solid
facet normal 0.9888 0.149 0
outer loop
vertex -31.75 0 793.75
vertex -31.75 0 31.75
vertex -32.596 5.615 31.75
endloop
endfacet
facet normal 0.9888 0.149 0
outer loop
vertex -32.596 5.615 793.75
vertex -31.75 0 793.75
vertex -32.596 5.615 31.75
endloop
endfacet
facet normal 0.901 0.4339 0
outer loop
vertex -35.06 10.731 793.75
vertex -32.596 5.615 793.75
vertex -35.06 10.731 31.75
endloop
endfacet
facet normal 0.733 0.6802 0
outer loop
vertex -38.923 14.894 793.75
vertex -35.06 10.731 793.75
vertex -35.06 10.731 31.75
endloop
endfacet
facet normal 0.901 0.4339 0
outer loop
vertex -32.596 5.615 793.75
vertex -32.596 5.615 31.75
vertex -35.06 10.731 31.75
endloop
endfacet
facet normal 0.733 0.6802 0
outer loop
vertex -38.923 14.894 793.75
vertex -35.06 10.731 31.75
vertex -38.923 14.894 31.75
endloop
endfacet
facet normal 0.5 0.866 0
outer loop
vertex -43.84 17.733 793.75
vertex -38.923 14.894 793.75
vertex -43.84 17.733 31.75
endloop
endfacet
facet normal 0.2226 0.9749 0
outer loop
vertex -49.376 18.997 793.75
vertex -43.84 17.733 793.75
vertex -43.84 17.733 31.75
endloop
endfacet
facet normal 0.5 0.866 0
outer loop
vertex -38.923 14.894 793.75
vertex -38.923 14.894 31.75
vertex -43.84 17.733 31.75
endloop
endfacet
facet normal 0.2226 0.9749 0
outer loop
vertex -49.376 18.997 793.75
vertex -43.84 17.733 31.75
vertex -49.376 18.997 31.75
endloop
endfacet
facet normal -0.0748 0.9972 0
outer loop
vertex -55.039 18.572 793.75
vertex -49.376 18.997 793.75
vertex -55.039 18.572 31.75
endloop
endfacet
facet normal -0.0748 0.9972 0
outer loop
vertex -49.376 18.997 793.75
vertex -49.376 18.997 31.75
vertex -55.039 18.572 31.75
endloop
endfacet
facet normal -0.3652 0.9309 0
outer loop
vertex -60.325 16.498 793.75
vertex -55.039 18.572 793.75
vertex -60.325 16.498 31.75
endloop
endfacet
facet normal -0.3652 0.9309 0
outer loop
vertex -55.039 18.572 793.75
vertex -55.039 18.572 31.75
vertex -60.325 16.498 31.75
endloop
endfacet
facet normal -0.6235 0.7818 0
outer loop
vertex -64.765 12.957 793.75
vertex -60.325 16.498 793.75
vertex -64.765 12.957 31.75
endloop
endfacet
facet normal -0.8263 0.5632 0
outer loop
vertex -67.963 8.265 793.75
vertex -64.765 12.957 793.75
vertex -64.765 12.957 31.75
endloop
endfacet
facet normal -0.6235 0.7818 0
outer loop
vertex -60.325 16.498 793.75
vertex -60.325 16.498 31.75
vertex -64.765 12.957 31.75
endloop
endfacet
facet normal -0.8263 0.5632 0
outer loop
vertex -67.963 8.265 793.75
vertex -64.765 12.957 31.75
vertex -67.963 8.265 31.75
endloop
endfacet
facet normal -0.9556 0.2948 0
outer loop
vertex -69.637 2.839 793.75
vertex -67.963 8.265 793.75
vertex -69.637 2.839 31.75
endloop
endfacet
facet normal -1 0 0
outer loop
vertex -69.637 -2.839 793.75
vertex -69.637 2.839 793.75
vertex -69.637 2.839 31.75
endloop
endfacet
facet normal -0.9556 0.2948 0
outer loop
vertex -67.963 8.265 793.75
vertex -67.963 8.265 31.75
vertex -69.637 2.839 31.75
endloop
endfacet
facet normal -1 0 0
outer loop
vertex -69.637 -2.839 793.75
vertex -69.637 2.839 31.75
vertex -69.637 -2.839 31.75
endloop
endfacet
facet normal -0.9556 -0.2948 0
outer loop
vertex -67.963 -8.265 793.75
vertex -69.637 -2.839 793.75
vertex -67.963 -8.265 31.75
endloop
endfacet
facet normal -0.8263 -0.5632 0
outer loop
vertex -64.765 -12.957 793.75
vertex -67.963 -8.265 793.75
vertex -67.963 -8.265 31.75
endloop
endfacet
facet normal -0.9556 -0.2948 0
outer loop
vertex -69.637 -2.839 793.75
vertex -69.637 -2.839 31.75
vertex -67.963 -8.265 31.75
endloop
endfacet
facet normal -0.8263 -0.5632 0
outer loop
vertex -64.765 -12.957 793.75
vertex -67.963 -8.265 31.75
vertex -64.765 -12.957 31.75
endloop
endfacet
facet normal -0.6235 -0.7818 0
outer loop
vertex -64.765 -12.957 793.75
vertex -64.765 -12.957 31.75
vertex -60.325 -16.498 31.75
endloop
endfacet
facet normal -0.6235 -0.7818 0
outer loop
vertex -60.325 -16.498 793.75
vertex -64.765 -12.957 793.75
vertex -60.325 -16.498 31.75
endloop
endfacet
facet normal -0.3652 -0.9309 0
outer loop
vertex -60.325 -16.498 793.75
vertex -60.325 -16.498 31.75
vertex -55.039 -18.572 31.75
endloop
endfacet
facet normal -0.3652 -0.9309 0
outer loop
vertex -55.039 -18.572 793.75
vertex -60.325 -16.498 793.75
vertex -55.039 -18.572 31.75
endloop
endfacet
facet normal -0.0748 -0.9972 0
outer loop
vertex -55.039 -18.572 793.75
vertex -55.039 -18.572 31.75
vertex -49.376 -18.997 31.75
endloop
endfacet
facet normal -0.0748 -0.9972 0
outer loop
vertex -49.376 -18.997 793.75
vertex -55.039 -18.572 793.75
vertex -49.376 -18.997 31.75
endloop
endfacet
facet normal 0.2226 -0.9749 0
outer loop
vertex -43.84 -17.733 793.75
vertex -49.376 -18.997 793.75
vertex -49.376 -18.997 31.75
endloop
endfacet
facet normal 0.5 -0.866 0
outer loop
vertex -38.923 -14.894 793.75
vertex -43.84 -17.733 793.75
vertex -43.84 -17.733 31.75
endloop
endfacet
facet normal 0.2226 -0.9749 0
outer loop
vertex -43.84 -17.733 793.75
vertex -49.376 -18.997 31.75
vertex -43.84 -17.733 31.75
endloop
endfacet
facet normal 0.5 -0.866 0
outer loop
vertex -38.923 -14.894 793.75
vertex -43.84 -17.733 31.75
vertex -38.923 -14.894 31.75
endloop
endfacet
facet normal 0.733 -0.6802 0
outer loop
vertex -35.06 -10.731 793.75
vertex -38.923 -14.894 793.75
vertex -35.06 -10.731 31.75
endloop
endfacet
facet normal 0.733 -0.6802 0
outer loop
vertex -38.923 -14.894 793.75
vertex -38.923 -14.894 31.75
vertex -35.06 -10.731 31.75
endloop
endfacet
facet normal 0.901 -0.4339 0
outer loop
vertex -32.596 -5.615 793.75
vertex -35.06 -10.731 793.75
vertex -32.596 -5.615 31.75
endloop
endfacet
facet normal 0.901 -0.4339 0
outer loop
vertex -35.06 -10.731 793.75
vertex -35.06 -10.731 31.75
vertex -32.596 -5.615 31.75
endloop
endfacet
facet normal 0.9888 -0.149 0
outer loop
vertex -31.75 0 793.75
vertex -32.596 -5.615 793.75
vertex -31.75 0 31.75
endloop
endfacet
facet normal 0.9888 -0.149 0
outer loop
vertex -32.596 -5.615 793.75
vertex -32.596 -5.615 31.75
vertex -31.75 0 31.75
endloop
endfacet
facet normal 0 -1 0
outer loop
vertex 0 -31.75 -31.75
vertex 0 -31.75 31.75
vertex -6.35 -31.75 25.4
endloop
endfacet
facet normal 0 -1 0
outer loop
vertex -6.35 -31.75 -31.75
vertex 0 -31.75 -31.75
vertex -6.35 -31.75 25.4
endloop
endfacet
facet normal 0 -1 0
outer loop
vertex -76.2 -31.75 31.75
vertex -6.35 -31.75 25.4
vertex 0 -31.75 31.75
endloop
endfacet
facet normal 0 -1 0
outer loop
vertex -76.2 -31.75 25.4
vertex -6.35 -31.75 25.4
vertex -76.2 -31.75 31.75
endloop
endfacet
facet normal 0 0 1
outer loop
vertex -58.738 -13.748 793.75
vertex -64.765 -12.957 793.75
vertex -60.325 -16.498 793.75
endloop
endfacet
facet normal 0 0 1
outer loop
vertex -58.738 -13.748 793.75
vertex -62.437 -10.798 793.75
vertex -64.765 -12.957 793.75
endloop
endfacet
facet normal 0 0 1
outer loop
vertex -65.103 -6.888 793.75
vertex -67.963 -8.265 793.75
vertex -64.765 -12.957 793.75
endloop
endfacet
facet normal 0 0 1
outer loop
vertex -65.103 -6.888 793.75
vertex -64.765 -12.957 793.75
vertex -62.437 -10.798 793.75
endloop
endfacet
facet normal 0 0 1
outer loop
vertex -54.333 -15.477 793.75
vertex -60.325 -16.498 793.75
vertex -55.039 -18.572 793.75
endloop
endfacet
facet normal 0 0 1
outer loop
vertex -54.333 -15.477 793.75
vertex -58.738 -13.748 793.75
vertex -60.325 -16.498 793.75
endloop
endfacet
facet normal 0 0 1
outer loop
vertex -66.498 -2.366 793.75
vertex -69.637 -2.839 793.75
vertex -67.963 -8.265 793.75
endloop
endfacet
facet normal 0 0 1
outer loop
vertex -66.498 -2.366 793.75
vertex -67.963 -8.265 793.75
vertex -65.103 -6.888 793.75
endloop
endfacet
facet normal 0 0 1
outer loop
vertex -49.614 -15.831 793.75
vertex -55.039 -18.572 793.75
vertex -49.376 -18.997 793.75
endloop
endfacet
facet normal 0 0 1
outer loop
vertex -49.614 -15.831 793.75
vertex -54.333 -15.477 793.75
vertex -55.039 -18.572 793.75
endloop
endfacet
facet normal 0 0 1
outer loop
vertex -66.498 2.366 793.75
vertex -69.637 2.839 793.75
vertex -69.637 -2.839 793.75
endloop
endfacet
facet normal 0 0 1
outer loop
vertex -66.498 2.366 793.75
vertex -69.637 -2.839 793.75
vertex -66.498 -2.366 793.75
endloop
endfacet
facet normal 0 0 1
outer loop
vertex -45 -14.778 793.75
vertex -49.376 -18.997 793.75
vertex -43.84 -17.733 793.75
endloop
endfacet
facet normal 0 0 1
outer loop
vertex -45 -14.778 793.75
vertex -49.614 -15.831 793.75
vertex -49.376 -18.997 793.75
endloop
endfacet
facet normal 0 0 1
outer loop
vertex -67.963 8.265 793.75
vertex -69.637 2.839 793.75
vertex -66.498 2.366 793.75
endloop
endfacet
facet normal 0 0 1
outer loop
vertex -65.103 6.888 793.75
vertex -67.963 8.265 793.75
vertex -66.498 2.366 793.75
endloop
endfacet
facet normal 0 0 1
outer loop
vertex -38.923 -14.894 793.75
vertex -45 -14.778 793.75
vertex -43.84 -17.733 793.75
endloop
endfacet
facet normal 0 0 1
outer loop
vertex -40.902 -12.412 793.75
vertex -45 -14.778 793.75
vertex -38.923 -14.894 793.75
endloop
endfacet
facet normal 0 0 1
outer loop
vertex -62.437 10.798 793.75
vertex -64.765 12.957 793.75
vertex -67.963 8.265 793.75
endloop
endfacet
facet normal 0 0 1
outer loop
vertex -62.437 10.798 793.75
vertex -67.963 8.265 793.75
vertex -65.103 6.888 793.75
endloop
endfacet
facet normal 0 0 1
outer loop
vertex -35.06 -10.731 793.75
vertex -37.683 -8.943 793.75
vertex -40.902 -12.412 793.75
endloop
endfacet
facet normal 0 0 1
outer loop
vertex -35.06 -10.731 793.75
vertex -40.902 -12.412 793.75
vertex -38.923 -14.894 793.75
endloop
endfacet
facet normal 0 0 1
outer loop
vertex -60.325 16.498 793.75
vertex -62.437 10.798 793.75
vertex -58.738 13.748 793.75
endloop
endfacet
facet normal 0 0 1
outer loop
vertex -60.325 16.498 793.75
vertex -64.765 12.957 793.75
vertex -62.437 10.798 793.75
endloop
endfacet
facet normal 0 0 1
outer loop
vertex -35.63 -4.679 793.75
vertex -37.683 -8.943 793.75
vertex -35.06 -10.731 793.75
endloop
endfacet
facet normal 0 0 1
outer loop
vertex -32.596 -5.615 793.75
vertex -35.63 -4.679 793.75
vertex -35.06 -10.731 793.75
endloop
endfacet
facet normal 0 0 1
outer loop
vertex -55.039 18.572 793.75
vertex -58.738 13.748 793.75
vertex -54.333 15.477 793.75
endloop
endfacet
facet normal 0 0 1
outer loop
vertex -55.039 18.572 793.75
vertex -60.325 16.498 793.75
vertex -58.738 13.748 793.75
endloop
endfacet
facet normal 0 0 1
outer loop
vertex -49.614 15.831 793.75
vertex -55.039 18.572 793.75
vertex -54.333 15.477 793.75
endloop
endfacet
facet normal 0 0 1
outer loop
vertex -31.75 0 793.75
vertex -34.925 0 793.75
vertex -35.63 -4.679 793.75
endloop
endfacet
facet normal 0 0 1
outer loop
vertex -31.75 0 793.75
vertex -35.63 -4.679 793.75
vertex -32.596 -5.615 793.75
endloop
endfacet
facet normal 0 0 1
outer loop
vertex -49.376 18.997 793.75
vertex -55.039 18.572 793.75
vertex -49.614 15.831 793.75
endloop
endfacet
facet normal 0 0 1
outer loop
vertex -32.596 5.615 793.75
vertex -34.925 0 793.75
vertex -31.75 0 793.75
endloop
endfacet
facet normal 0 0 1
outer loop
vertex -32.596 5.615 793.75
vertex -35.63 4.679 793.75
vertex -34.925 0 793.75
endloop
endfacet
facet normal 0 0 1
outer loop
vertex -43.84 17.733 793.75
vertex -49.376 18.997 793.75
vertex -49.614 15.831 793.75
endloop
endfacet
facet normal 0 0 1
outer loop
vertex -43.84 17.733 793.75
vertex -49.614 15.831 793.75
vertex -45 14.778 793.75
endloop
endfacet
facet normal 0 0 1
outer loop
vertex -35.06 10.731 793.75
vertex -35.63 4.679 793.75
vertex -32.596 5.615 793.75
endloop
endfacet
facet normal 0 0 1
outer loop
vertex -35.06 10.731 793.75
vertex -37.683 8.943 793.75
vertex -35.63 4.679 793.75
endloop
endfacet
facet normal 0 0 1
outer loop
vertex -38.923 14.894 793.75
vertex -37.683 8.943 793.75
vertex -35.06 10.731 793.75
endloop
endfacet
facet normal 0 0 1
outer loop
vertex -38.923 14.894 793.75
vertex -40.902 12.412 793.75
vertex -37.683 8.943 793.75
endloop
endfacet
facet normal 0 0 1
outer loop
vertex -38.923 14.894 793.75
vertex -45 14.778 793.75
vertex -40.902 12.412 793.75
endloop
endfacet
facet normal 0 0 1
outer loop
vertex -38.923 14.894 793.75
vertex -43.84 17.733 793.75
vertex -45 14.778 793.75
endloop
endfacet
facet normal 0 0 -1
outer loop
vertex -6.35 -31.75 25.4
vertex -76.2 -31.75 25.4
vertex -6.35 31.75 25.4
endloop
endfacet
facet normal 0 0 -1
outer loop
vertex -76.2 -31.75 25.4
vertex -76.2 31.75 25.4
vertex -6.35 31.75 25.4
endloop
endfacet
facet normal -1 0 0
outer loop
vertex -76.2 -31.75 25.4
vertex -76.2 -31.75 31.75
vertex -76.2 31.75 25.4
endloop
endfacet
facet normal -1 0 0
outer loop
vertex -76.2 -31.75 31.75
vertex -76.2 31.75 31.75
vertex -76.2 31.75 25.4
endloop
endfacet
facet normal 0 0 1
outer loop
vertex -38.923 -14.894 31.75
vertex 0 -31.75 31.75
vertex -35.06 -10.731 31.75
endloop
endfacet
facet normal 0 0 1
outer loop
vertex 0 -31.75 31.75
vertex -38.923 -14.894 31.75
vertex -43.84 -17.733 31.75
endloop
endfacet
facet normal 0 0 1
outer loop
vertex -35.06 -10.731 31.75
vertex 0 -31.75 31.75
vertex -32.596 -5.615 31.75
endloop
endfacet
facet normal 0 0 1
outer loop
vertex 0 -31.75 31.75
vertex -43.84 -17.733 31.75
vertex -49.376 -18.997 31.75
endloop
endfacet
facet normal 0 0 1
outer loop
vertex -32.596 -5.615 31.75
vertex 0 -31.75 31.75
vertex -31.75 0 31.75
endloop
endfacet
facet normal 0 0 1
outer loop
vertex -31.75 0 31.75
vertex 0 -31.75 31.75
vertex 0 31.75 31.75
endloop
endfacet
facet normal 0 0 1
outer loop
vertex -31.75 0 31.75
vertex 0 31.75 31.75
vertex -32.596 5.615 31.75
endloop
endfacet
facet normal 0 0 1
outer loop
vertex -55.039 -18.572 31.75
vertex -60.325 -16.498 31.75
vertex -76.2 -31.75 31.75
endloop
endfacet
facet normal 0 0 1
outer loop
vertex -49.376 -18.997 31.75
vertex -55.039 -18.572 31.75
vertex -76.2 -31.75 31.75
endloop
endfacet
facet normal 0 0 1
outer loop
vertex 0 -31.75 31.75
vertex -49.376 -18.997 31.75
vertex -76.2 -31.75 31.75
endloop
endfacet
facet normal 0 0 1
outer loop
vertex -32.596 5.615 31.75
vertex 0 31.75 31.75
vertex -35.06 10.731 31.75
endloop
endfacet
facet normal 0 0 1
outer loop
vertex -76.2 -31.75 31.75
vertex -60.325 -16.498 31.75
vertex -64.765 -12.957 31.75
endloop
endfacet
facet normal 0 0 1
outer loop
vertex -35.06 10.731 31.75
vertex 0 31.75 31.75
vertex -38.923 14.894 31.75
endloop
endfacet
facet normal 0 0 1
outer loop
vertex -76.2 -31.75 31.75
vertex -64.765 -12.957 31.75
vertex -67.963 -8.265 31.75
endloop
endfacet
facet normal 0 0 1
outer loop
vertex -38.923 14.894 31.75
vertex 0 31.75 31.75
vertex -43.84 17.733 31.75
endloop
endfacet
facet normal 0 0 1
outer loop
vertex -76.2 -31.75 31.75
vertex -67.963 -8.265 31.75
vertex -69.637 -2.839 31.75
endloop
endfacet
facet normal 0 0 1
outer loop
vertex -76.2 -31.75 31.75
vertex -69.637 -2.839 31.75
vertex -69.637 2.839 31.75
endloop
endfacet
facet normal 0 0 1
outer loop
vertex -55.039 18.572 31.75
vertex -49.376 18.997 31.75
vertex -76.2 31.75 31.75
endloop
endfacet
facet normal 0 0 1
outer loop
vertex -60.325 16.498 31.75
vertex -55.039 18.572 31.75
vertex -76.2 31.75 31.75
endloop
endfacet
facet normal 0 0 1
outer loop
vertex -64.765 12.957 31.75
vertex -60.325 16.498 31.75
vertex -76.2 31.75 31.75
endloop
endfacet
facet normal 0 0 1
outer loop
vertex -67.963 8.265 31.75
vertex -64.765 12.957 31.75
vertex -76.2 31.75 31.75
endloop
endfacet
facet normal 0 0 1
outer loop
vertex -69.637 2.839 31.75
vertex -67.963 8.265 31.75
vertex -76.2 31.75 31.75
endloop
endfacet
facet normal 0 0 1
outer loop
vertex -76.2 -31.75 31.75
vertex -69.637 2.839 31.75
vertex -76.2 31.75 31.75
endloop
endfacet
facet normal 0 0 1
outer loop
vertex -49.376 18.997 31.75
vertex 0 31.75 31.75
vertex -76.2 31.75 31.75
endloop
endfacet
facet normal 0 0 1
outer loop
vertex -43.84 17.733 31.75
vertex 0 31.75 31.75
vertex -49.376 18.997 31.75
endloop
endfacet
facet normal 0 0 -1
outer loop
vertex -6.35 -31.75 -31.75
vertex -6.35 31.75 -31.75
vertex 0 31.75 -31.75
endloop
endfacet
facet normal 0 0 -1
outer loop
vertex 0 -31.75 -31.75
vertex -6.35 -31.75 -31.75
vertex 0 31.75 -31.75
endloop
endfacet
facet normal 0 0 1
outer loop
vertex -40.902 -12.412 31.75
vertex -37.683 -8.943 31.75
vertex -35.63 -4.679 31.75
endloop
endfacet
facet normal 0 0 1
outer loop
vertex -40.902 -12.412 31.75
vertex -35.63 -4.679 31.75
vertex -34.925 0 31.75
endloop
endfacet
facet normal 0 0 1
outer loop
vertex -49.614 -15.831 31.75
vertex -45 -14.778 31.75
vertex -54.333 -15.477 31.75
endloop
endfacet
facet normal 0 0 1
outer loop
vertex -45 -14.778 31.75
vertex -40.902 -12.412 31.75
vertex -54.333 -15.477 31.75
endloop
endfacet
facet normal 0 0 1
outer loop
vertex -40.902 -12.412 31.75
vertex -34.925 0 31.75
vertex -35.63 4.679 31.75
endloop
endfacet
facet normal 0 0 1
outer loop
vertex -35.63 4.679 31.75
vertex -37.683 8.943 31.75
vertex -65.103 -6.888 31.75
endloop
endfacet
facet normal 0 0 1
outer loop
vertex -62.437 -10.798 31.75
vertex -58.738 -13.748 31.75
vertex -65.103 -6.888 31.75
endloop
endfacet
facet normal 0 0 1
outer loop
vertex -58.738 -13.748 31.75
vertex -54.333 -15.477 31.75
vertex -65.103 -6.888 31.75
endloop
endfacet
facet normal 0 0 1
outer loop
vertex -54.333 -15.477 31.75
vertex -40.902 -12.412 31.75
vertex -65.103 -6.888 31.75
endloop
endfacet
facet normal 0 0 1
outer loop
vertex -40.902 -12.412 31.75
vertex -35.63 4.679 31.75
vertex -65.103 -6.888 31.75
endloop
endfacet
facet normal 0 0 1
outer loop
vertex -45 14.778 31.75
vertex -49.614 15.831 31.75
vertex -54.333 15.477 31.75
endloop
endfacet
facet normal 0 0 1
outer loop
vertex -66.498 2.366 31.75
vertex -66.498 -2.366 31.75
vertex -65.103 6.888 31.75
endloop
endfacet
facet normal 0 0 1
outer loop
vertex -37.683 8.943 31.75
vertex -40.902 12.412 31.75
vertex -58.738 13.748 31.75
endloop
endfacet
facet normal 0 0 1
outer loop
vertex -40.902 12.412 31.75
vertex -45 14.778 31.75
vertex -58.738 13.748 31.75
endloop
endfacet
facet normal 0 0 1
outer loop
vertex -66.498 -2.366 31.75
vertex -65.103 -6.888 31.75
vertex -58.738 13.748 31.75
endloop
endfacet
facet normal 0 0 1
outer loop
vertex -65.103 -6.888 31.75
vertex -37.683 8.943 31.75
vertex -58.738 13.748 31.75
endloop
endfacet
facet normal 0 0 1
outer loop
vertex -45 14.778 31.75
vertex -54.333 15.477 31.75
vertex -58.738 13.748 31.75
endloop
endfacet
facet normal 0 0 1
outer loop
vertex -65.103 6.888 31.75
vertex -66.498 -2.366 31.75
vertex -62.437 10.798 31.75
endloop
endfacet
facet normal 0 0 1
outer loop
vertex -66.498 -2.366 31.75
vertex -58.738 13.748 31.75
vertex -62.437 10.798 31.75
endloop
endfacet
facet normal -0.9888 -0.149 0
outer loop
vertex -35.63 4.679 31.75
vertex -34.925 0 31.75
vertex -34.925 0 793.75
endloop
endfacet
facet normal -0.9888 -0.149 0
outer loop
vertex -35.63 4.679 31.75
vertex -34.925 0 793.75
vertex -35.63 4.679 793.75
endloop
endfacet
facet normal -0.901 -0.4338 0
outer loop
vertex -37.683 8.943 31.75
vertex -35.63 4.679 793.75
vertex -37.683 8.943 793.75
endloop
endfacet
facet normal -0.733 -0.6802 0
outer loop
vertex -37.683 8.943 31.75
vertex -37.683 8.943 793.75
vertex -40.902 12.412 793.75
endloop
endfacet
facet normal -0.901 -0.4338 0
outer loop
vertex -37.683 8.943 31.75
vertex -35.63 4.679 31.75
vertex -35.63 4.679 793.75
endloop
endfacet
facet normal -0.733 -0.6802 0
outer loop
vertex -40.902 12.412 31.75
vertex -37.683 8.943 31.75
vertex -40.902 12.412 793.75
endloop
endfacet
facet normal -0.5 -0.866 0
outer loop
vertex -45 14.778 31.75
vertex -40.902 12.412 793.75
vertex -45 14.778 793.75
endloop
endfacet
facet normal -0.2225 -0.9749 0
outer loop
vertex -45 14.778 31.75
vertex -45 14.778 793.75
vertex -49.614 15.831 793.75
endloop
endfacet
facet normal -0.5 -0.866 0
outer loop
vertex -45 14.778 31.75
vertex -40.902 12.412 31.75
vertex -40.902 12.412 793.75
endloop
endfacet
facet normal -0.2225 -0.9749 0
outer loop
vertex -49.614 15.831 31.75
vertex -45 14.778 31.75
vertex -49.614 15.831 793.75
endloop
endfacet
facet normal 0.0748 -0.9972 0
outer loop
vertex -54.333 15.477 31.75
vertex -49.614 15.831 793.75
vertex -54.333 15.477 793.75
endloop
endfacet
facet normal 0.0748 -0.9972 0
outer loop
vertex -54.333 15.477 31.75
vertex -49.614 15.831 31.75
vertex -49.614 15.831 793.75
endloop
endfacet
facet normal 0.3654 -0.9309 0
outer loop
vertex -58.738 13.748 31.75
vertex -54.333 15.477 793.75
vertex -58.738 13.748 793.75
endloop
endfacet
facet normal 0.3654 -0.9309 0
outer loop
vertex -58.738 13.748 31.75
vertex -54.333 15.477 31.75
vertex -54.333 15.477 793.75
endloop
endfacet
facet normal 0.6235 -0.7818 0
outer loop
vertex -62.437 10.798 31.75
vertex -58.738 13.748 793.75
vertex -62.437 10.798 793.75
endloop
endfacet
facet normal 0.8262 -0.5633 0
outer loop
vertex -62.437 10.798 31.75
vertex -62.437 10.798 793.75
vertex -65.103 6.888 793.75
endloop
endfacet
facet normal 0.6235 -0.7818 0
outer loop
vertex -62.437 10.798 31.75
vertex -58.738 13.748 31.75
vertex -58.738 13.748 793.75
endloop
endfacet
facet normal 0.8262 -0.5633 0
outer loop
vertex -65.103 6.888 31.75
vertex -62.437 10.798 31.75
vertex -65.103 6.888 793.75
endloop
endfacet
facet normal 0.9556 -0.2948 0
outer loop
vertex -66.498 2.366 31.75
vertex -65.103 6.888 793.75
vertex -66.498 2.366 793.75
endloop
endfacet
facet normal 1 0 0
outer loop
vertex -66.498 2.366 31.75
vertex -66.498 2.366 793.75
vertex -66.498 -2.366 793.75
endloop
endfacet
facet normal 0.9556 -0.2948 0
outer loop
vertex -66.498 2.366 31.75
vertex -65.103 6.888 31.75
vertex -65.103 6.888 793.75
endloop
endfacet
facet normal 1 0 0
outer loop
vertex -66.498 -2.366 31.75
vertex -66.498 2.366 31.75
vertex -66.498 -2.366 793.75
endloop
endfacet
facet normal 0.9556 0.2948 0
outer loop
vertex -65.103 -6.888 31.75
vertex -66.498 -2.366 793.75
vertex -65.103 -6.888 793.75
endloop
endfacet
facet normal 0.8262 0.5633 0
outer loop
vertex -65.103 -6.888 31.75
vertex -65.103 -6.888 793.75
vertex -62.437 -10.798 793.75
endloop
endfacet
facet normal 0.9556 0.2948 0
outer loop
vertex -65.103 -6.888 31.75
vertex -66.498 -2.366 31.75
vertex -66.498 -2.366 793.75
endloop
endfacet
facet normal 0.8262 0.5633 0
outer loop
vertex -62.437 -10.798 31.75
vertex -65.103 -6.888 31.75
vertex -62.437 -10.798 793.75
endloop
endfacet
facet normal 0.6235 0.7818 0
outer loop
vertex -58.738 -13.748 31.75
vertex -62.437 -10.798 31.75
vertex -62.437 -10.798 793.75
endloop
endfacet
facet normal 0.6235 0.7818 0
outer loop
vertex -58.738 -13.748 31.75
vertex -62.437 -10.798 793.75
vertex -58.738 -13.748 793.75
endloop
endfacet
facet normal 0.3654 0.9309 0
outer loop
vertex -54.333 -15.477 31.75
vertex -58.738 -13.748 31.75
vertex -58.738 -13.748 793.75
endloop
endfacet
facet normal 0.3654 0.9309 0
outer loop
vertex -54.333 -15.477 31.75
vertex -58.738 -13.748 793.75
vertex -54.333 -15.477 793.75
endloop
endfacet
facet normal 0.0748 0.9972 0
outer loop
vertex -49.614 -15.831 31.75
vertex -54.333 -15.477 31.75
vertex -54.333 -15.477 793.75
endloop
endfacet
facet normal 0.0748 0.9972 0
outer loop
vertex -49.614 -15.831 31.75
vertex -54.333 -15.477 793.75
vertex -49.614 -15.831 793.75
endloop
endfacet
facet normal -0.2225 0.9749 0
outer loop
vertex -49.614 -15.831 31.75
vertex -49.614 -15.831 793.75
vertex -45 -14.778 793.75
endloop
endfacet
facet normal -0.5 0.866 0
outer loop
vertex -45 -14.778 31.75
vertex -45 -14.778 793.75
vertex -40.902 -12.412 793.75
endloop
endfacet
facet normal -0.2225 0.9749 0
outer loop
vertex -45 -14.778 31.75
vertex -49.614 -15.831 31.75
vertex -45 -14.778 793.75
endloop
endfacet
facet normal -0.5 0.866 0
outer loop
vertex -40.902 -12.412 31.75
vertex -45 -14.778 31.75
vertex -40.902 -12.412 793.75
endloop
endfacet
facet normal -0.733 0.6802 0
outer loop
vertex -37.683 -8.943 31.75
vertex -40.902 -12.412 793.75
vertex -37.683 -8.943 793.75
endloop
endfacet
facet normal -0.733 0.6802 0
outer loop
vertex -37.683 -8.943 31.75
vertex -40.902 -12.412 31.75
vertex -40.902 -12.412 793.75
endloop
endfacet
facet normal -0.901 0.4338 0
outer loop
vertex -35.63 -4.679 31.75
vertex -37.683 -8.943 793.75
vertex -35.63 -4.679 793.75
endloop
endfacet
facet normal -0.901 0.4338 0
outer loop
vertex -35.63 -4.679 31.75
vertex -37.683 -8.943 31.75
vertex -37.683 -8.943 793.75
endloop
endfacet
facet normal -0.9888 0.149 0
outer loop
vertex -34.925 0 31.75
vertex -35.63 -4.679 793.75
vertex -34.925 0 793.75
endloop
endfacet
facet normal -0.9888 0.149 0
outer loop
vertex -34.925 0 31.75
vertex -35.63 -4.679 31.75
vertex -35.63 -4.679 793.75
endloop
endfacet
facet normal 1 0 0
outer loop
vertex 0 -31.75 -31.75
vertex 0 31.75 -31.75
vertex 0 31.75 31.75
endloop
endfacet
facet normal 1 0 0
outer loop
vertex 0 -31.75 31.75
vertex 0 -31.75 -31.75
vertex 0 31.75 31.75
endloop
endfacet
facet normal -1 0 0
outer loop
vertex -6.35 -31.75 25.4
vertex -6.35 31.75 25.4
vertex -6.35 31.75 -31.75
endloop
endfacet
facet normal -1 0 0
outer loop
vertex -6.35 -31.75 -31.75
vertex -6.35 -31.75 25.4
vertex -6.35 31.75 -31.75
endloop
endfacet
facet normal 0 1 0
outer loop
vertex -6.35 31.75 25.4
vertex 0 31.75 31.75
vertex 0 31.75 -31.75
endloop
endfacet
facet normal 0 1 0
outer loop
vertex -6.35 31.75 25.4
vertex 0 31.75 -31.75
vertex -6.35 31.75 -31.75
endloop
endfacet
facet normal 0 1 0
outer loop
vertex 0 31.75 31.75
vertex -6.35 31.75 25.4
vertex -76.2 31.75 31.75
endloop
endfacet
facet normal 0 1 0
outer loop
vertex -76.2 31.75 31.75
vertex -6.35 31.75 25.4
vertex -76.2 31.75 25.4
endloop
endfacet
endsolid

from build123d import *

# Parameters (mm, degrees)
BOSS_EXTRUDE1_DEPTH = 31.75
SKETCH2_R           = 19.05
SKETCH2_R_2         = 15.875
BOSS_EXTRUDE2_DEPTH = 762


with BuildPart() as part:
    # Sketch1 → Boss-Extrude1 (new body, symmetric)
    with BuildSketch(Plane(origin=(0, 0, 0), x_dir=(1, 0, 0), z_dir=(0, 1, 0))):
        Polygon((0, 31.75), (0, -31.75), (-76.2, -31.75), (-76.2, -25.4), (-6.35, -25.4), (-6.35, 31.75), align=None)
    extrude(amount=BOSS_EXTRUDE1_DEPTH, both=True)

    # Sketch2 → Boss-Extrude2 (add)
    with BuildSketch(Plane.XY.offset(31.75)):
        with Locations((-50.8, 0)):
            Circle(SKETCH2_R)
        with Locations((-50.8, 0)):
            Circle(SKETCH2_R_2, mode=Mode.SUBTRACT)
    extrude(amount=BOSS_EXTRUDE2_DEPTH)


solid = part.part
